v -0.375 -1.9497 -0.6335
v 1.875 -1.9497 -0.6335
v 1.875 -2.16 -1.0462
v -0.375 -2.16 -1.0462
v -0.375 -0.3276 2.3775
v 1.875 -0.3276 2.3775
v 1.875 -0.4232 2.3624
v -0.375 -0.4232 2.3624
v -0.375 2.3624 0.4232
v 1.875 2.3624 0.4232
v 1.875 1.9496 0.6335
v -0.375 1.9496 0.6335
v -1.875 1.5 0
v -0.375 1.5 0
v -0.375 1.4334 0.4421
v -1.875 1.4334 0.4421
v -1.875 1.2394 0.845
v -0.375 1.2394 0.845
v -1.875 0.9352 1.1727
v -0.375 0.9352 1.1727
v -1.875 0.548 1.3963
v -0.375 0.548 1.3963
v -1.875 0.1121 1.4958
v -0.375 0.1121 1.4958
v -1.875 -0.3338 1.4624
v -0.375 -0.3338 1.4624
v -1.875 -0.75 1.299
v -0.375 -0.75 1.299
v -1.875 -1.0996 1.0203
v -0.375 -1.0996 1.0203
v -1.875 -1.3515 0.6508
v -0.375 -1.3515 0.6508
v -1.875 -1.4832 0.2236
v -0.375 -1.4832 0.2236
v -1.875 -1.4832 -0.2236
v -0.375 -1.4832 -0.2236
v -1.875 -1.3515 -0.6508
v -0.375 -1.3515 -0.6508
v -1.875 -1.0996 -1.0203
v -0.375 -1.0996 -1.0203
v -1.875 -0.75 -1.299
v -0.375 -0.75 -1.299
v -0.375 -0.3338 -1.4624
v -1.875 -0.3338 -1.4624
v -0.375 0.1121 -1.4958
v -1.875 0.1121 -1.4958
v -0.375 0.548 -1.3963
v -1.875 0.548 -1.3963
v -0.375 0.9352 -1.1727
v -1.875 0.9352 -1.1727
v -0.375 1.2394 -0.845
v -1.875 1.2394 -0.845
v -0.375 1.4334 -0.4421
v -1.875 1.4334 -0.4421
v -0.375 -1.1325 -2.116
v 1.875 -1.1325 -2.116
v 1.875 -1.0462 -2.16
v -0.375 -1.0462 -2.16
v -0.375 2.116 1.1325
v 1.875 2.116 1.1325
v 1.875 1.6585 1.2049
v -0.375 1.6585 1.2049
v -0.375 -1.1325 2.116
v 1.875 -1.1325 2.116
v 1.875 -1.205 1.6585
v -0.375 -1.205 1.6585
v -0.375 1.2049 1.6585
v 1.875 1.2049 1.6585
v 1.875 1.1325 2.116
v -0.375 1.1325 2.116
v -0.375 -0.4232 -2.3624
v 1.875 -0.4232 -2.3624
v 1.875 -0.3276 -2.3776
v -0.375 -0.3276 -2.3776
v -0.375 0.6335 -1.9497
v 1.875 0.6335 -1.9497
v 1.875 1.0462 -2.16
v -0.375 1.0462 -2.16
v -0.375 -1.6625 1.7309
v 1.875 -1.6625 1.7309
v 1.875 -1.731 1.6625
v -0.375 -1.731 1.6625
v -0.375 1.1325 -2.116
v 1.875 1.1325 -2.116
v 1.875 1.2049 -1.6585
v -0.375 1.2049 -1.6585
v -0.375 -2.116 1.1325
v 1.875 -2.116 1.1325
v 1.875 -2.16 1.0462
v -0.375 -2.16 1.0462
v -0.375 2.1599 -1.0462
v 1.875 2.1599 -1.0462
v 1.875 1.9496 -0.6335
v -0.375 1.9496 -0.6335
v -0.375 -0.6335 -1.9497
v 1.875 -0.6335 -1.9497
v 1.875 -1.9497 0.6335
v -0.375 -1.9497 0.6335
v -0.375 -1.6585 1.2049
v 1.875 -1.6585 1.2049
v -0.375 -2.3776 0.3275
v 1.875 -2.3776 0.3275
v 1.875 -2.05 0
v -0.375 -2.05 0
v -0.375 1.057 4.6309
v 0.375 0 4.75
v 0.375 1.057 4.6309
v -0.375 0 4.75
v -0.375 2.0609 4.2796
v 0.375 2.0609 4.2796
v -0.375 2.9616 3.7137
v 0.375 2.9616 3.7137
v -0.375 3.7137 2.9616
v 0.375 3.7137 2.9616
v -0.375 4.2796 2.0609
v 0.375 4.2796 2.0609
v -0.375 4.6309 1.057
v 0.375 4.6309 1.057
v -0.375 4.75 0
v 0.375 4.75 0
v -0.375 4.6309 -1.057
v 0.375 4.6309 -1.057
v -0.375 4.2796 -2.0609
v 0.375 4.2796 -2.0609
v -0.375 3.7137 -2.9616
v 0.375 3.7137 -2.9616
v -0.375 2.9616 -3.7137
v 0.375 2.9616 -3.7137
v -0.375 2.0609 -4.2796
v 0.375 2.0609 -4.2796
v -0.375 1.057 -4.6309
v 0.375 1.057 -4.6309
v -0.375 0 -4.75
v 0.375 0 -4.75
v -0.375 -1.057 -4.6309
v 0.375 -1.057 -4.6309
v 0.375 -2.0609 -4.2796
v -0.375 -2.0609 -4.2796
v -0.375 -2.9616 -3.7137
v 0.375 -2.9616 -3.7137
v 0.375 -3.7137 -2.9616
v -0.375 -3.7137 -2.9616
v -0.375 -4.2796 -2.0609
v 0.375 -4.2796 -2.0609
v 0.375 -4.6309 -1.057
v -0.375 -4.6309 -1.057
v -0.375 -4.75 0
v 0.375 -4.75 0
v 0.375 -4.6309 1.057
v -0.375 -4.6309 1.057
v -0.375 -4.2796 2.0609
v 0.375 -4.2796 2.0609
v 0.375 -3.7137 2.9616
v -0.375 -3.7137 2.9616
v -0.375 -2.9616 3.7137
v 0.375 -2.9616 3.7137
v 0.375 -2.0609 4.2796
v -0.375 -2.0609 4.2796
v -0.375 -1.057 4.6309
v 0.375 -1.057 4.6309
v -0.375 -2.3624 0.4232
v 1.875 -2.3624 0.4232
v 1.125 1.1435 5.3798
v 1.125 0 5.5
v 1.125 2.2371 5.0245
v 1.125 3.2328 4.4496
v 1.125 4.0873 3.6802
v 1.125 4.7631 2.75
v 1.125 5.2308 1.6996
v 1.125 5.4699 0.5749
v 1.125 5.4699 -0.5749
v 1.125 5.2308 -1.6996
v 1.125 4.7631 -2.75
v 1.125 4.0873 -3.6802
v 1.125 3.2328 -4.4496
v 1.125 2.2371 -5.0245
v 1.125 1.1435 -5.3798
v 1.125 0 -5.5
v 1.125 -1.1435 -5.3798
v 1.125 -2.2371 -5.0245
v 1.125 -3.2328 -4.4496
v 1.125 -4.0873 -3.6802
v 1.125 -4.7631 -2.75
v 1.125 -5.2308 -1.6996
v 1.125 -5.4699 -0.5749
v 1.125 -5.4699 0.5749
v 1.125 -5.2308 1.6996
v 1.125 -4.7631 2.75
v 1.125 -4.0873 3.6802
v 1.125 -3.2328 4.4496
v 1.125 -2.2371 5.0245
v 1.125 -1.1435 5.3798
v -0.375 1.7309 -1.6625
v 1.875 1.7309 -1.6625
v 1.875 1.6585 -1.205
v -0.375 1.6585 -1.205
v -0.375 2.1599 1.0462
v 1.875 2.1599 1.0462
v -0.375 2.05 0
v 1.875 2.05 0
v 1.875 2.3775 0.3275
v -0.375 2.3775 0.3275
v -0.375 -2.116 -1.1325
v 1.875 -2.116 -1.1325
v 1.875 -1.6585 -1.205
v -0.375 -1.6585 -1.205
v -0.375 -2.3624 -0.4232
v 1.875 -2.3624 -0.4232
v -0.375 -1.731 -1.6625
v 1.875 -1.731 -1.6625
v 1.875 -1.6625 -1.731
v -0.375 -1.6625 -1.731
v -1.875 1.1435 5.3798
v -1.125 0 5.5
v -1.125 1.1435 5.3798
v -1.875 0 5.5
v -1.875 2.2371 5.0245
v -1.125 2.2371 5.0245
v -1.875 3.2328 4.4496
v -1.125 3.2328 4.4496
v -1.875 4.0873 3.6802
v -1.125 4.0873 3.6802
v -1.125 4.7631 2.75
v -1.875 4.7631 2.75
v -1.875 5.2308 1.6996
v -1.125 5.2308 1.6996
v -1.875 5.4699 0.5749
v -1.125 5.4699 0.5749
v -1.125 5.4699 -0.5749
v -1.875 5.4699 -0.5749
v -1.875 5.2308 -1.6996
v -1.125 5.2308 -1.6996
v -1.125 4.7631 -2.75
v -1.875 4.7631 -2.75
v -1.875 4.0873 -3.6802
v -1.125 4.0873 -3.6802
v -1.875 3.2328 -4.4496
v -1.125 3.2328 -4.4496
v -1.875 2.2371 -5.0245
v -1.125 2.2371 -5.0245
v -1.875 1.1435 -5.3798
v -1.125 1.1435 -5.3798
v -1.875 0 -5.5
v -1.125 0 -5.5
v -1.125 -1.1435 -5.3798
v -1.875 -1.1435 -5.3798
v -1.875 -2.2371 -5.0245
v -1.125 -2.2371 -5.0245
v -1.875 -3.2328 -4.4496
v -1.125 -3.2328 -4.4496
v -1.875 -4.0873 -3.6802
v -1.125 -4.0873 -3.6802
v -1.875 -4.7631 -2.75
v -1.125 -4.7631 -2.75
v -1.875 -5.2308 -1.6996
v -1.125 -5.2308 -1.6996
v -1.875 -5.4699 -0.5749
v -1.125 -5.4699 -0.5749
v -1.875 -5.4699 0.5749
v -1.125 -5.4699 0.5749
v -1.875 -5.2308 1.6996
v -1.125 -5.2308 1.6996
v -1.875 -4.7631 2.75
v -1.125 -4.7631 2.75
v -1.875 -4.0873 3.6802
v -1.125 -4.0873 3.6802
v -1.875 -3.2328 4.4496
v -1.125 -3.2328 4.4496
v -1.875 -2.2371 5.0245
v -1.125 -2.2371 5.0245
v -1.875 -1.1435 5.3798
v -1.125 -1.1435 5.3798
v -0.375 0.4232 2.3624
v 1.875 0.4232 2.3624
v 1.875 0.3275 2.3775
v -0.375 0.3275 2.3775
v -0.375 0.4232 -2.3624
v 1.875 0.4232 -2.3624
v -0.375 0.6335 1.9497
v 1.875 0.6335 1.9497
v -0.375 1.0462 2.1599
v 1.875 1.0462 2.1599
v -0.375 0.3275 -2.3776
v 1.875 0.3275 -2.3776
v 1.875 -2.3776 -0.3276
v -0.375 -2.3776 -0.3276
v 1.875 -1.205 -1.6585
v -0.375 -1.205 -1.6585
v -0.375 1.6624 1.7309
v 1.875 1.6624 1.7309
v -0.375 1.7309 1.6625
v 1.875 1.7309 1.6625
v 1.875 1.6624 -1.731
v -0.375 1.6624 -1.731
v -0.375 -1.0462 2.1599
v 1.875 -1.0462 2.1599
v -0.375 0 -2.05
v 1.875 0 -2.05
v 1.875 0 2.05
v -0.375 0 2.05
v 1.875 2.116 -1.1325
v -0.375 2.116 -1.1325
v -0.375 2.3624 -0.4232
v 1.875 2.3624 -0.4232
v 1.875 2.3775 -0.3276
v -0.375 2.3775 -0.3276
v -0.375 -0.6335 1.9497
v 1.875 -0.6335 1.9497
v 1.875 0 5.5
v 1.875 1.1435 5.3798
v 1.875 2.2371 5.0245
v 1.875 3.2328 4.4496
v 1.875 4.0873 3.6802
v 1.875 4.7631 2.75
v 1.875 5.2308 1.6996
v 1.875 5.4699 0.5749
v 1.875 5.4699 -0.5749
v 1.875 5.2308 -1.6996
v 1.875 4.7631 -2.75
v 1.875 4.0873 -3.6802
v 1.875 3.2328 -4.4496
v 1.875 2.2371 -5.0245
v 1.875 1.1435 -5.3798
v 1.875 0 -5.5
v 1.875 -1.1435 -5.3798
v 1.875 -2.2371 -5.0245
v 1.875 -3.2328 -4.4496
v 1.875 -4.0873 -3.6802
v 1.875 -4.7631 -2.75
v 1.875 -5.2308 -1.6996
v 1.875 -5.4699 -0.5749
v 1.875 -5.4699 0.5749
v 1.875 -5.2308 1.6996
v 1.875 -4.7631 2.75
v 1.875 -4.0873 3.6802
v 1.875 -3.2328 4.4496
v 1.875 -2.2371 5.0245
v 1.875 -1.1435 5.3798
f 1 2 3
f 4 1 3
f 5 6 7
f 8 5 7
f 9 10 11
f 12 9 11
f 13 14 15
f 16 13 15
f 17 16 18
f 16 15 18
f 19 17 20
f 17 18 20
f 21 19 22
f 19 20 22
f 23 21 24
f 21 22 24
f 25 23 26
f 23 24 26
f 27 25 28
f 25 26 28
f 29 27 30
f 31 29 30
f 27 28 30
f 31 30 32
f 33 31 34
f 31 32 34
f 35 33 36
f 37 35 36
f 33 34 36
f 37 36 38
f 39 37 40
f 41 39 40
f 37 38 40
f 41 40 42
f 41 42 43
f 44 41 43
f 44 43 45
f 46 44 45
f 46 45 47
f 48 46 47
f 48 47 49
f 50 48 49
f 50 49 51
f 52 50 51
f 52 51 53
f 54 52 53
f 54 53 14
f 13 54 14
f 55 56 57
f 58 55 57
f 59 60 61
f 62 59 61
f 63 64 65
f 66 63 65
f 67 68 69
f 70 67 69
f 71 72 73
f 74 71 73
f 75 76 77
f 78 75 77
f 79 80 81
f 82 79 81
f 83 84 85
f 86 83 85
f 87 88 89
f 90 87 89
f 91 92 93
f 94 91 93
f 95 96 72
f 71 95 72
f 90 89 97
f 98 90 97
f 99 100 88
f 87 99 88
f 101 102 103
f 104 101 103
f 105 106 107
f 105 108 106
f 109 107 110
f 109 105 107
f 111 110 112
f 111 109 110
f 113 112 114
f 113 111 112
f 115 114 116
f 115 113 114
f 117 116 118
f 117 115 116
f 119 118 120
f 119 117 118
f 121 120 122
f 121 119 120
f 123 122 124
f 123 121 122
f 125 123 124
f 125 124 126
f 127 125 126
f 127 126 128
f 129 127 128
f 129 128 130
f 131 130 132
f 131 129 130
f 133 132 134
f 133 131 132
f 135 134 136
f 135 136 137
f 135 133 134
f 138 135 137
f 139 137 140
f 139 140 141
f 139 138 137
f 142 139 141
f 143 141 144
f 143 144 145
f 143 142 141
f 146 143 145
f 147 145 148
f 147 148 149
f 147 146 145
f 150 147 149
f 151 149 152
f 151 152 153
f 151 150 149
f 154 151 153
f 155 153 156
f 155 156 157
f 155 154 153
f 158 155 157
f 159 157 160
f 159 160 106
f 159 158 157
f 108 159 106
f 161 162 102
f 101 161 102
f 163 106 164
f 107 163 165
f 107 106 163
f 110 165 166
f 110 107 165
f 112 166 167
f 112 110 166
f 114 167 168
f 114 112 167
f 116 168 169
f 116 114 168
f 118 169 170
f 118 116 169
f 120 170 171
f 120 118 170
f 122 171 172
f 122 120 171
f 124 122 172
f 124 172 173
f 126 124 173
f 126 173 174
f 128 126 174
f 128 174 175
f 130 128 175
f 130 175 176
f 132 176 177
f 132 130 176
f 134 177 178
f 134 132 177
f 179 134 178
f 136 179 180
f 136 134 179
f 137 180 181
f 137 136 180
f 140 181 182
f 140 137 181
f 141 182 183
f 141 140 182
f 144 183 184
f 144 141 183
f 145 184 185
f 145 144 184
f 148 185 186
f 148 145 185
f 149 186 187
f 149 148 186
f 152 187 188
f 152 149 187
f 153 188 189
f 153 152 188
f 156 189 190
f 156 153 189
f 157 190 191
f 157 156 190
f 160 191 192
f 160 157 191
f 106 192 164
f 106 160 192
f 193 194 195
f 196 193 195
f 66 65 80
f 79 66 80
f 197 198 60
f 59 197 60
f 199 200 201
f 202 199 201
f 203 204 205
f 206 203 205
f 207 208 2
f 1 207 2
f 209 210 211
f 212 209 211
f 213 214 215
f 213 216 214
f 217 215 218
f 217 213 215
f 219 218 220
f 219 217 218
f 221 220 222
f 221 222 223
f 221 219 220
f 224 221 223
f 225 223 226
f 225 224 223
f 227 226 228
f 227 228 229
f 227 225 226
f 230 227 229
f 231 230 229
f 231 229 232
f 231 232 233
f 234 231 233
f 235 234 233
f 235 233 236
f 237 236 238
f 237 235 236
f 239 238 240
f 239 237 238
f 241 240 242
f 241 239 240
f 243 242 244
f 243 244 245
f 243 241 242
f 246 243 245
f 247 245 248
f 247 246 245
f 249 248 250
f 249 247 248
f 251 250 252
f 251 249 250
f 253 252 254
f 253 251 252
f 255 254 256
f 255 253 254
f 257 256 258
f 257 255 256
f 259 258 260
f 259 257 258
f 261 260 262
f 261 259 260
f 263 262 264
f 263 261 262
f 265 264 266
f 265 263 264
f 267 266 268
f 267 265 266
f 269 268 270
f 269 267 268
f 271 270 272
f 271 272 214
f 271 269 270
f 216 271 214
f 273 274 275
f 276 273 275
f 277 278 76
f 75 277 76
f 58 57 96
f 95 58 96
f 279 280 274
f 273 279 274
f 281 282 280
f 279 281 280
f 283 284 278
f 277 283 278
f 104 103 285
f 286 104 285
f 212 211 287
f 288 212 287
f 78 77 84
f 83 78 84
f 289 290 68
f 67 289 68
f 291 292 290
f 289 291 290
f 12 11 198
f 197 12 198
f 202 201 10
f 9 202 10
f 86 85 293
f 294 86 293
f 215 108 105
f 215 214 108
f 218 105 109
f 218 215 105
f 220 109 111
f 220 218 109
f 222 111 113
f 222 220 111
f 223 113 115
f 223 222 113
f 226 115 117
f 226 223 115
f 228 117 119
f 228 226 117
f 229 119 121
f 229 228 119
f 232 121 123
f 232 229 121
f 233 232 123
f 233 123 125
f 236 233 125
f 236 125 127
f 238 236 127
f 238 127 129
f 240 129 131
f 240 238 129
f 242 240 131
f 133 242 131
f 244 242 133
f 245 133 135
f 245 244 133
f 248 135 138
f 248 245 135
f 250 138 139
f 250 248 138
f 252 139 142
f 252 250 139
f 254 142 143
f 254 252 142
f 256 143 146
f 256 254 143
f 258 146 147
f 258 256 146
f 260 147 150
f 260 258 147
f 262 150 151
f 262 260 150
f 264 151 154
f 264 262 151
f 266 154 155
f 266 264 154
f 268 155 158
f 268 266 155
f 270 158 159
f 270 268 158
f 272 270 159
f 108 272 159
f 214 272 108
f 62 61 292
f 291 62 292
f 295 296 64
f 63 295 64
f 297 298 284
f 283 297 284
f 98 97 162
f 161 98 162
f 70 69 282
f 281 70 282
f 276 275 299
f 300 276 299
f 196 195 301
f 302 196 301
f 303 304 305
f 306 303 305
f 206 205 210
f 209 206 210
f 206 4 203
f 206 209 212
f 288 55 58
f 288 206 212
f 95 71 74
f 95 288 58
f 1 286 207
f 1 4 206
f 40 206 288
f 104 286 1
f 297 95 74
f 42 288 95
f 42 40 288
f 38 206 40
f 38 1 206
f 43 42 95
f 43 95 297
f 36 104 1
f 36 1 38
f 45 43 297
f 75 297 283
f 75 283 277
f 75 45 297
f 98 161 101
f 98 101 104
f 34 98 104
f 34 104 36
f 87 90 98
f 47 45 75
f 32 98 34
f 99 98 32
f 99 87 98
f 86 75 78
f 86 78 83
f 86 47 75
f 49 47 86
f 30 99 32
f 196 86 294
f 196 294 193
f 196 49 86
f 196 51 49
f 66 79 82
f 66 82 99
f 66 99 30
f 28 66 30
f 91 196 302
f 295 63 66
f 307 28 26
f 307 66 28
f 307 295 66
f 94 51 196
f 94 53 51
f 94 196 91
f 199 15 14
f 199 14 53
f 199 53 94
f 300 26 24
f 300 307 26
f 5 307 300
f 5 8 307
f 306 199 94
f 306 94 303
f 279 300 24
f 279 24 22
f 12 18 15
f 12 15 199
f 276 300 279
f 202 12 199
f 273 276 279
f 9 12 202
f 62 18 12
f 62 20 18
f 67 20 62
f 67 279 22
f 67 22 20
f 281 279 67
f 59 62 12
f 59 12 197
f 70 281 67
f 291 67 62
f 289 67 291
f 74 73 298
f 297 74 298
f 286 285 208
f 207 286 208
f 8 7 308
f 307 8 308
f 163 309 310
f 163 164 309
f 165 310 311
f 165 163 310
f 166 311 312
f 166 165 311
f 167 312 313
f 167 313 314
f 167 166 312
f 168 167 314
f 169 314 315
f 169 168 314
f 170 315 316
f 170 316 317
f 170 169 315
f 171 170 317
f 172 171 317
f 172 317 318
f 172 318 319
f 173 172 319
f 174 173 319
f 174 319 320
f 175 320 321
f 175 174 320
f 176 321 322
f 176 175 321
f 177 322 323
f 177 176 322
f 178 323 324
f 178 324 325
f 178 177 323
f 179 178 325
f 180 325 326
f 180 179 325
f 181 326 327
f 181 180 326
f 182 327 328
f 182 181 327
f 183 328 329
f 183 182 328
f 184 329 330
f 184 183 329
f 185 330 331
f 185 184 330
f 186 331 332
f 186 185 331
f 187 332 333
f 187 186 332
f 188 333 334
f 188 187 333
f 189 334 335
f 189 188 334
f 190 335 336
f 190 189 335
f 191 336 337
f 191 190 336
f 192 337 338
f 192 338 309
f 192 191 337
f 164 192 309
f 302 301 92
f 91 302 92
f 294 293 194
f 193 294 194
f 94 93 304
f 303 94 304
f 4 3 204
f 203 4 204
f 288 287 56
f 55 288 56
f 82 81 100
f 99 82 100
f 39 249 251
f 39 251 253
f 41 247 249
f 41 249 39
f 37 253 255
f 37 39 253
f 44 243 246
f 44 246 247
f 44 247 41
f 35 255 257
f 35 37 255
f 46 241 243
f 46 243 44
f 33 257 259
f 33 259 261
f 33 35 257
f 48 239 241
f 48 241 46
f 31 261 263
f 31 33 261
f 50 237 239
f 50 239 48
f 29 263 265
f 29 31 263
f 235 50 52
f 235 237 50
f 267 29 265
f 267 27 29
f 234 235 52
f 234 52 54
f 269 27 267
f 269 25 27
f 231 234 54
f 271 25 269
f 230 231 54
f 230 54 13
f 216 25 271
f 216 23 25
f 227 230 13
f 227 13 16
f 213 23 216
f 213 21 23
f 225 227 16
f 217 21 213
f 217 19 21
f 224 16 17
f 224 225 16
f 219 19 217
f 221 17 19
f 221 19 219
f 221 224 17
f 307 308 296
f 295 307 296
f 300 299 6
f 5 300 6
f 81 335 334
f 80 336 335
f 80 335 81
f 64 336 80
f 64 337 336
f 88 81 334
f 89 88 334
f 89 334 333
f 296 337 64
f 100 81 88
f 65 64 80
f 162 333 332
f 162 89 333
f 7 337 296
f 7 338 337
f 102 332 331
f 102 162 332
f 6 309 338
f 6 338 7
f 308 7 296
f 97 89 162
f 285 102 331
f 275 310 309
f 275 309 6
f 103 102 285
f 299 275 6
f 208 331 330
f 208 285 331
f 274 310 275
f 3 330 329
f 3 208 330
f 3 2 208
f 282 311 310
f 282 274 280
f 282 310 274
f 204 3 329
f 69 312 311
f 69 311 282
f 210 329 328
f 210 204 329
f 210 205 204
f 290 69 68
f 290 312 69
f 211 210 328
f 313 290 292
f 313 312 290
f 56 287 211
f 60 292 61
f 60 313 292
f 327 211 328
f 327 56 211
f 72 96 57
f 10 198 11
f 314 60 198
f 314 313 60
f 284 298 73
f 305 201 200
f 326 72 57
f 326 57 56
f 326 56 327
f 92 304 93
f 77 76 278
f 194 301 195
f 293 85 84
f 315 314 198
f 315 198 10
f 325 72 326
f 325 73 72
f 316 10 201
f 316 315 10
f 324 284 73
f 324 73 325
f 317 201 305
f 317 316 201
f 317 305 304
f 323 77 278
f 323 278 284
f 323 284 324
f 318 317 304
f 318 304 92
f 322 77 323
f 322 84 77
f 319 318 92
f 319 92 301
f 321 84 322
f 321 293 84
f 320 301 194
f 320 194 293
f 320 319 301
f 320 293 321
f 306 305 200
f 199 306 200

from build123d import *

# Parameters (mm, degrees)
F2_R     = 1.5
F3_DEPTH = 2.25
F4_DEPTH = 3.751


with BuildPart() as f1:
    # F0 (on Front) → F1 (revolve)
    with BuildSketch(Plane.XZ):
        Polygon((-1.875, 5.5), (-1.875, 0), (1.875, 0), (1.875, 5.5), (1.125, 5.5), (0.375, 4.75), (-0.375, 4.75), (-1.125, 5.5), align=None)
    revolve(axis=Axis((0, 0, 0), (-1, 0, 0)))

    # F2 (on face) → F3 (cut)
    with BuildSketch(Plane.YZ.offset(1.875)):
        Polygon((-0.6335184836, 1.9496536007), (-1.0462478749, 2.1599497294), (-1.1325303049, 2.1159866355), (-1.2049934123, 1.6584725808), (-1.662507467, 1.7309356883), (-1.7309815911, 1.6624615642), (-1.6585184836, 1.2049475095), (-2.1160325383, 1.132484402), (-2.1599956322, 1.0462019721), (-1.9496995035, 0.6334725808), (-2.3624288949, 0.4231764522), (-2.3775775446, 0.3275316418), (-2.0500336451, -1.22577e-05), (-2.3775775446, -0.3275561571), (-2.3624288949, -0.4232009675), (-1.9496995035, -0.6334970961), (-2.1599956322, -1.0462264874), (-2.1160325383, -1.1325089174), (-1.6585184836, -1.2049720249), (-1.7309815911, -1.6624860795), (-1.662507467, -1.7309602036), (-1.2049934123, -1.6584970961), (-1.1325303049, -2.1160111508), (-1.0462478749, -2.1599742447), (-0.6335184836, -1.9496781161), (-0.423222355, -2.3624075074), (-0.3275775446, -2.3775561571), (-3.36451e-05, -2.0500122577), (0.3275102543, -2.3775561571), (0.4231550647, -2.3624075074), (0.6334511933, -1.9496781161), (1.0461805846, -2.1599742447), (1.1324630146, -2.1160111508), (1.2049261221, -1.6584970961), (1.6624401767, -1.7309602036), (1.7309143008, -1.6624860795), (1.6584511933, -1.2049720249), (2.115965248, -1.1325089174), (2.1599283419, -1.0462264874), (1.9496322133, -0.6334970961), (2.3623616046, -0.4232009675), (2.3775102543, -0.3275561571), (2.0499663549, -1.22577e-05), (2.3775102543, 0.3275316418), (2.3623616046, 0.4231764522), (1.9496322133, 0.6334725808), (2.1599283419, 1.0462019721), (2.115965248, 1.132484402), (1.6584511933, 1.2049475095), (1.7309143008, 1.6624615642), (1.6624401767, 1.7309356883), (1.2049261221, 1.6584725808), (1.1324630146, 2.1159866355), (1.0461805846, 2.1599497294), (0.6334511933, 1.9496536007), (0.4231550647, 2.3623829921), (0.3275102543, 2.3775316418), (-3.36451e-05, 2.0499877423), (-0.3275775446, 2.3775316418), (-0.423222355, 2.3623829921), align=None)
        Circle(F2_R, mode=Mode.SUBTRACT)
    extrude(amount=-F3_DEPTH, mode=Mode.SUBTRACT)

    # F2 (on face) → F4 (cut, through all)
    with BuildSketch(Plane.YZ.offset(1.875)):
        Circle(F2_R)
    extrude(amount=-F4_DEPTH, mode=Mode.SUBTRACT)


solid = f1.part
